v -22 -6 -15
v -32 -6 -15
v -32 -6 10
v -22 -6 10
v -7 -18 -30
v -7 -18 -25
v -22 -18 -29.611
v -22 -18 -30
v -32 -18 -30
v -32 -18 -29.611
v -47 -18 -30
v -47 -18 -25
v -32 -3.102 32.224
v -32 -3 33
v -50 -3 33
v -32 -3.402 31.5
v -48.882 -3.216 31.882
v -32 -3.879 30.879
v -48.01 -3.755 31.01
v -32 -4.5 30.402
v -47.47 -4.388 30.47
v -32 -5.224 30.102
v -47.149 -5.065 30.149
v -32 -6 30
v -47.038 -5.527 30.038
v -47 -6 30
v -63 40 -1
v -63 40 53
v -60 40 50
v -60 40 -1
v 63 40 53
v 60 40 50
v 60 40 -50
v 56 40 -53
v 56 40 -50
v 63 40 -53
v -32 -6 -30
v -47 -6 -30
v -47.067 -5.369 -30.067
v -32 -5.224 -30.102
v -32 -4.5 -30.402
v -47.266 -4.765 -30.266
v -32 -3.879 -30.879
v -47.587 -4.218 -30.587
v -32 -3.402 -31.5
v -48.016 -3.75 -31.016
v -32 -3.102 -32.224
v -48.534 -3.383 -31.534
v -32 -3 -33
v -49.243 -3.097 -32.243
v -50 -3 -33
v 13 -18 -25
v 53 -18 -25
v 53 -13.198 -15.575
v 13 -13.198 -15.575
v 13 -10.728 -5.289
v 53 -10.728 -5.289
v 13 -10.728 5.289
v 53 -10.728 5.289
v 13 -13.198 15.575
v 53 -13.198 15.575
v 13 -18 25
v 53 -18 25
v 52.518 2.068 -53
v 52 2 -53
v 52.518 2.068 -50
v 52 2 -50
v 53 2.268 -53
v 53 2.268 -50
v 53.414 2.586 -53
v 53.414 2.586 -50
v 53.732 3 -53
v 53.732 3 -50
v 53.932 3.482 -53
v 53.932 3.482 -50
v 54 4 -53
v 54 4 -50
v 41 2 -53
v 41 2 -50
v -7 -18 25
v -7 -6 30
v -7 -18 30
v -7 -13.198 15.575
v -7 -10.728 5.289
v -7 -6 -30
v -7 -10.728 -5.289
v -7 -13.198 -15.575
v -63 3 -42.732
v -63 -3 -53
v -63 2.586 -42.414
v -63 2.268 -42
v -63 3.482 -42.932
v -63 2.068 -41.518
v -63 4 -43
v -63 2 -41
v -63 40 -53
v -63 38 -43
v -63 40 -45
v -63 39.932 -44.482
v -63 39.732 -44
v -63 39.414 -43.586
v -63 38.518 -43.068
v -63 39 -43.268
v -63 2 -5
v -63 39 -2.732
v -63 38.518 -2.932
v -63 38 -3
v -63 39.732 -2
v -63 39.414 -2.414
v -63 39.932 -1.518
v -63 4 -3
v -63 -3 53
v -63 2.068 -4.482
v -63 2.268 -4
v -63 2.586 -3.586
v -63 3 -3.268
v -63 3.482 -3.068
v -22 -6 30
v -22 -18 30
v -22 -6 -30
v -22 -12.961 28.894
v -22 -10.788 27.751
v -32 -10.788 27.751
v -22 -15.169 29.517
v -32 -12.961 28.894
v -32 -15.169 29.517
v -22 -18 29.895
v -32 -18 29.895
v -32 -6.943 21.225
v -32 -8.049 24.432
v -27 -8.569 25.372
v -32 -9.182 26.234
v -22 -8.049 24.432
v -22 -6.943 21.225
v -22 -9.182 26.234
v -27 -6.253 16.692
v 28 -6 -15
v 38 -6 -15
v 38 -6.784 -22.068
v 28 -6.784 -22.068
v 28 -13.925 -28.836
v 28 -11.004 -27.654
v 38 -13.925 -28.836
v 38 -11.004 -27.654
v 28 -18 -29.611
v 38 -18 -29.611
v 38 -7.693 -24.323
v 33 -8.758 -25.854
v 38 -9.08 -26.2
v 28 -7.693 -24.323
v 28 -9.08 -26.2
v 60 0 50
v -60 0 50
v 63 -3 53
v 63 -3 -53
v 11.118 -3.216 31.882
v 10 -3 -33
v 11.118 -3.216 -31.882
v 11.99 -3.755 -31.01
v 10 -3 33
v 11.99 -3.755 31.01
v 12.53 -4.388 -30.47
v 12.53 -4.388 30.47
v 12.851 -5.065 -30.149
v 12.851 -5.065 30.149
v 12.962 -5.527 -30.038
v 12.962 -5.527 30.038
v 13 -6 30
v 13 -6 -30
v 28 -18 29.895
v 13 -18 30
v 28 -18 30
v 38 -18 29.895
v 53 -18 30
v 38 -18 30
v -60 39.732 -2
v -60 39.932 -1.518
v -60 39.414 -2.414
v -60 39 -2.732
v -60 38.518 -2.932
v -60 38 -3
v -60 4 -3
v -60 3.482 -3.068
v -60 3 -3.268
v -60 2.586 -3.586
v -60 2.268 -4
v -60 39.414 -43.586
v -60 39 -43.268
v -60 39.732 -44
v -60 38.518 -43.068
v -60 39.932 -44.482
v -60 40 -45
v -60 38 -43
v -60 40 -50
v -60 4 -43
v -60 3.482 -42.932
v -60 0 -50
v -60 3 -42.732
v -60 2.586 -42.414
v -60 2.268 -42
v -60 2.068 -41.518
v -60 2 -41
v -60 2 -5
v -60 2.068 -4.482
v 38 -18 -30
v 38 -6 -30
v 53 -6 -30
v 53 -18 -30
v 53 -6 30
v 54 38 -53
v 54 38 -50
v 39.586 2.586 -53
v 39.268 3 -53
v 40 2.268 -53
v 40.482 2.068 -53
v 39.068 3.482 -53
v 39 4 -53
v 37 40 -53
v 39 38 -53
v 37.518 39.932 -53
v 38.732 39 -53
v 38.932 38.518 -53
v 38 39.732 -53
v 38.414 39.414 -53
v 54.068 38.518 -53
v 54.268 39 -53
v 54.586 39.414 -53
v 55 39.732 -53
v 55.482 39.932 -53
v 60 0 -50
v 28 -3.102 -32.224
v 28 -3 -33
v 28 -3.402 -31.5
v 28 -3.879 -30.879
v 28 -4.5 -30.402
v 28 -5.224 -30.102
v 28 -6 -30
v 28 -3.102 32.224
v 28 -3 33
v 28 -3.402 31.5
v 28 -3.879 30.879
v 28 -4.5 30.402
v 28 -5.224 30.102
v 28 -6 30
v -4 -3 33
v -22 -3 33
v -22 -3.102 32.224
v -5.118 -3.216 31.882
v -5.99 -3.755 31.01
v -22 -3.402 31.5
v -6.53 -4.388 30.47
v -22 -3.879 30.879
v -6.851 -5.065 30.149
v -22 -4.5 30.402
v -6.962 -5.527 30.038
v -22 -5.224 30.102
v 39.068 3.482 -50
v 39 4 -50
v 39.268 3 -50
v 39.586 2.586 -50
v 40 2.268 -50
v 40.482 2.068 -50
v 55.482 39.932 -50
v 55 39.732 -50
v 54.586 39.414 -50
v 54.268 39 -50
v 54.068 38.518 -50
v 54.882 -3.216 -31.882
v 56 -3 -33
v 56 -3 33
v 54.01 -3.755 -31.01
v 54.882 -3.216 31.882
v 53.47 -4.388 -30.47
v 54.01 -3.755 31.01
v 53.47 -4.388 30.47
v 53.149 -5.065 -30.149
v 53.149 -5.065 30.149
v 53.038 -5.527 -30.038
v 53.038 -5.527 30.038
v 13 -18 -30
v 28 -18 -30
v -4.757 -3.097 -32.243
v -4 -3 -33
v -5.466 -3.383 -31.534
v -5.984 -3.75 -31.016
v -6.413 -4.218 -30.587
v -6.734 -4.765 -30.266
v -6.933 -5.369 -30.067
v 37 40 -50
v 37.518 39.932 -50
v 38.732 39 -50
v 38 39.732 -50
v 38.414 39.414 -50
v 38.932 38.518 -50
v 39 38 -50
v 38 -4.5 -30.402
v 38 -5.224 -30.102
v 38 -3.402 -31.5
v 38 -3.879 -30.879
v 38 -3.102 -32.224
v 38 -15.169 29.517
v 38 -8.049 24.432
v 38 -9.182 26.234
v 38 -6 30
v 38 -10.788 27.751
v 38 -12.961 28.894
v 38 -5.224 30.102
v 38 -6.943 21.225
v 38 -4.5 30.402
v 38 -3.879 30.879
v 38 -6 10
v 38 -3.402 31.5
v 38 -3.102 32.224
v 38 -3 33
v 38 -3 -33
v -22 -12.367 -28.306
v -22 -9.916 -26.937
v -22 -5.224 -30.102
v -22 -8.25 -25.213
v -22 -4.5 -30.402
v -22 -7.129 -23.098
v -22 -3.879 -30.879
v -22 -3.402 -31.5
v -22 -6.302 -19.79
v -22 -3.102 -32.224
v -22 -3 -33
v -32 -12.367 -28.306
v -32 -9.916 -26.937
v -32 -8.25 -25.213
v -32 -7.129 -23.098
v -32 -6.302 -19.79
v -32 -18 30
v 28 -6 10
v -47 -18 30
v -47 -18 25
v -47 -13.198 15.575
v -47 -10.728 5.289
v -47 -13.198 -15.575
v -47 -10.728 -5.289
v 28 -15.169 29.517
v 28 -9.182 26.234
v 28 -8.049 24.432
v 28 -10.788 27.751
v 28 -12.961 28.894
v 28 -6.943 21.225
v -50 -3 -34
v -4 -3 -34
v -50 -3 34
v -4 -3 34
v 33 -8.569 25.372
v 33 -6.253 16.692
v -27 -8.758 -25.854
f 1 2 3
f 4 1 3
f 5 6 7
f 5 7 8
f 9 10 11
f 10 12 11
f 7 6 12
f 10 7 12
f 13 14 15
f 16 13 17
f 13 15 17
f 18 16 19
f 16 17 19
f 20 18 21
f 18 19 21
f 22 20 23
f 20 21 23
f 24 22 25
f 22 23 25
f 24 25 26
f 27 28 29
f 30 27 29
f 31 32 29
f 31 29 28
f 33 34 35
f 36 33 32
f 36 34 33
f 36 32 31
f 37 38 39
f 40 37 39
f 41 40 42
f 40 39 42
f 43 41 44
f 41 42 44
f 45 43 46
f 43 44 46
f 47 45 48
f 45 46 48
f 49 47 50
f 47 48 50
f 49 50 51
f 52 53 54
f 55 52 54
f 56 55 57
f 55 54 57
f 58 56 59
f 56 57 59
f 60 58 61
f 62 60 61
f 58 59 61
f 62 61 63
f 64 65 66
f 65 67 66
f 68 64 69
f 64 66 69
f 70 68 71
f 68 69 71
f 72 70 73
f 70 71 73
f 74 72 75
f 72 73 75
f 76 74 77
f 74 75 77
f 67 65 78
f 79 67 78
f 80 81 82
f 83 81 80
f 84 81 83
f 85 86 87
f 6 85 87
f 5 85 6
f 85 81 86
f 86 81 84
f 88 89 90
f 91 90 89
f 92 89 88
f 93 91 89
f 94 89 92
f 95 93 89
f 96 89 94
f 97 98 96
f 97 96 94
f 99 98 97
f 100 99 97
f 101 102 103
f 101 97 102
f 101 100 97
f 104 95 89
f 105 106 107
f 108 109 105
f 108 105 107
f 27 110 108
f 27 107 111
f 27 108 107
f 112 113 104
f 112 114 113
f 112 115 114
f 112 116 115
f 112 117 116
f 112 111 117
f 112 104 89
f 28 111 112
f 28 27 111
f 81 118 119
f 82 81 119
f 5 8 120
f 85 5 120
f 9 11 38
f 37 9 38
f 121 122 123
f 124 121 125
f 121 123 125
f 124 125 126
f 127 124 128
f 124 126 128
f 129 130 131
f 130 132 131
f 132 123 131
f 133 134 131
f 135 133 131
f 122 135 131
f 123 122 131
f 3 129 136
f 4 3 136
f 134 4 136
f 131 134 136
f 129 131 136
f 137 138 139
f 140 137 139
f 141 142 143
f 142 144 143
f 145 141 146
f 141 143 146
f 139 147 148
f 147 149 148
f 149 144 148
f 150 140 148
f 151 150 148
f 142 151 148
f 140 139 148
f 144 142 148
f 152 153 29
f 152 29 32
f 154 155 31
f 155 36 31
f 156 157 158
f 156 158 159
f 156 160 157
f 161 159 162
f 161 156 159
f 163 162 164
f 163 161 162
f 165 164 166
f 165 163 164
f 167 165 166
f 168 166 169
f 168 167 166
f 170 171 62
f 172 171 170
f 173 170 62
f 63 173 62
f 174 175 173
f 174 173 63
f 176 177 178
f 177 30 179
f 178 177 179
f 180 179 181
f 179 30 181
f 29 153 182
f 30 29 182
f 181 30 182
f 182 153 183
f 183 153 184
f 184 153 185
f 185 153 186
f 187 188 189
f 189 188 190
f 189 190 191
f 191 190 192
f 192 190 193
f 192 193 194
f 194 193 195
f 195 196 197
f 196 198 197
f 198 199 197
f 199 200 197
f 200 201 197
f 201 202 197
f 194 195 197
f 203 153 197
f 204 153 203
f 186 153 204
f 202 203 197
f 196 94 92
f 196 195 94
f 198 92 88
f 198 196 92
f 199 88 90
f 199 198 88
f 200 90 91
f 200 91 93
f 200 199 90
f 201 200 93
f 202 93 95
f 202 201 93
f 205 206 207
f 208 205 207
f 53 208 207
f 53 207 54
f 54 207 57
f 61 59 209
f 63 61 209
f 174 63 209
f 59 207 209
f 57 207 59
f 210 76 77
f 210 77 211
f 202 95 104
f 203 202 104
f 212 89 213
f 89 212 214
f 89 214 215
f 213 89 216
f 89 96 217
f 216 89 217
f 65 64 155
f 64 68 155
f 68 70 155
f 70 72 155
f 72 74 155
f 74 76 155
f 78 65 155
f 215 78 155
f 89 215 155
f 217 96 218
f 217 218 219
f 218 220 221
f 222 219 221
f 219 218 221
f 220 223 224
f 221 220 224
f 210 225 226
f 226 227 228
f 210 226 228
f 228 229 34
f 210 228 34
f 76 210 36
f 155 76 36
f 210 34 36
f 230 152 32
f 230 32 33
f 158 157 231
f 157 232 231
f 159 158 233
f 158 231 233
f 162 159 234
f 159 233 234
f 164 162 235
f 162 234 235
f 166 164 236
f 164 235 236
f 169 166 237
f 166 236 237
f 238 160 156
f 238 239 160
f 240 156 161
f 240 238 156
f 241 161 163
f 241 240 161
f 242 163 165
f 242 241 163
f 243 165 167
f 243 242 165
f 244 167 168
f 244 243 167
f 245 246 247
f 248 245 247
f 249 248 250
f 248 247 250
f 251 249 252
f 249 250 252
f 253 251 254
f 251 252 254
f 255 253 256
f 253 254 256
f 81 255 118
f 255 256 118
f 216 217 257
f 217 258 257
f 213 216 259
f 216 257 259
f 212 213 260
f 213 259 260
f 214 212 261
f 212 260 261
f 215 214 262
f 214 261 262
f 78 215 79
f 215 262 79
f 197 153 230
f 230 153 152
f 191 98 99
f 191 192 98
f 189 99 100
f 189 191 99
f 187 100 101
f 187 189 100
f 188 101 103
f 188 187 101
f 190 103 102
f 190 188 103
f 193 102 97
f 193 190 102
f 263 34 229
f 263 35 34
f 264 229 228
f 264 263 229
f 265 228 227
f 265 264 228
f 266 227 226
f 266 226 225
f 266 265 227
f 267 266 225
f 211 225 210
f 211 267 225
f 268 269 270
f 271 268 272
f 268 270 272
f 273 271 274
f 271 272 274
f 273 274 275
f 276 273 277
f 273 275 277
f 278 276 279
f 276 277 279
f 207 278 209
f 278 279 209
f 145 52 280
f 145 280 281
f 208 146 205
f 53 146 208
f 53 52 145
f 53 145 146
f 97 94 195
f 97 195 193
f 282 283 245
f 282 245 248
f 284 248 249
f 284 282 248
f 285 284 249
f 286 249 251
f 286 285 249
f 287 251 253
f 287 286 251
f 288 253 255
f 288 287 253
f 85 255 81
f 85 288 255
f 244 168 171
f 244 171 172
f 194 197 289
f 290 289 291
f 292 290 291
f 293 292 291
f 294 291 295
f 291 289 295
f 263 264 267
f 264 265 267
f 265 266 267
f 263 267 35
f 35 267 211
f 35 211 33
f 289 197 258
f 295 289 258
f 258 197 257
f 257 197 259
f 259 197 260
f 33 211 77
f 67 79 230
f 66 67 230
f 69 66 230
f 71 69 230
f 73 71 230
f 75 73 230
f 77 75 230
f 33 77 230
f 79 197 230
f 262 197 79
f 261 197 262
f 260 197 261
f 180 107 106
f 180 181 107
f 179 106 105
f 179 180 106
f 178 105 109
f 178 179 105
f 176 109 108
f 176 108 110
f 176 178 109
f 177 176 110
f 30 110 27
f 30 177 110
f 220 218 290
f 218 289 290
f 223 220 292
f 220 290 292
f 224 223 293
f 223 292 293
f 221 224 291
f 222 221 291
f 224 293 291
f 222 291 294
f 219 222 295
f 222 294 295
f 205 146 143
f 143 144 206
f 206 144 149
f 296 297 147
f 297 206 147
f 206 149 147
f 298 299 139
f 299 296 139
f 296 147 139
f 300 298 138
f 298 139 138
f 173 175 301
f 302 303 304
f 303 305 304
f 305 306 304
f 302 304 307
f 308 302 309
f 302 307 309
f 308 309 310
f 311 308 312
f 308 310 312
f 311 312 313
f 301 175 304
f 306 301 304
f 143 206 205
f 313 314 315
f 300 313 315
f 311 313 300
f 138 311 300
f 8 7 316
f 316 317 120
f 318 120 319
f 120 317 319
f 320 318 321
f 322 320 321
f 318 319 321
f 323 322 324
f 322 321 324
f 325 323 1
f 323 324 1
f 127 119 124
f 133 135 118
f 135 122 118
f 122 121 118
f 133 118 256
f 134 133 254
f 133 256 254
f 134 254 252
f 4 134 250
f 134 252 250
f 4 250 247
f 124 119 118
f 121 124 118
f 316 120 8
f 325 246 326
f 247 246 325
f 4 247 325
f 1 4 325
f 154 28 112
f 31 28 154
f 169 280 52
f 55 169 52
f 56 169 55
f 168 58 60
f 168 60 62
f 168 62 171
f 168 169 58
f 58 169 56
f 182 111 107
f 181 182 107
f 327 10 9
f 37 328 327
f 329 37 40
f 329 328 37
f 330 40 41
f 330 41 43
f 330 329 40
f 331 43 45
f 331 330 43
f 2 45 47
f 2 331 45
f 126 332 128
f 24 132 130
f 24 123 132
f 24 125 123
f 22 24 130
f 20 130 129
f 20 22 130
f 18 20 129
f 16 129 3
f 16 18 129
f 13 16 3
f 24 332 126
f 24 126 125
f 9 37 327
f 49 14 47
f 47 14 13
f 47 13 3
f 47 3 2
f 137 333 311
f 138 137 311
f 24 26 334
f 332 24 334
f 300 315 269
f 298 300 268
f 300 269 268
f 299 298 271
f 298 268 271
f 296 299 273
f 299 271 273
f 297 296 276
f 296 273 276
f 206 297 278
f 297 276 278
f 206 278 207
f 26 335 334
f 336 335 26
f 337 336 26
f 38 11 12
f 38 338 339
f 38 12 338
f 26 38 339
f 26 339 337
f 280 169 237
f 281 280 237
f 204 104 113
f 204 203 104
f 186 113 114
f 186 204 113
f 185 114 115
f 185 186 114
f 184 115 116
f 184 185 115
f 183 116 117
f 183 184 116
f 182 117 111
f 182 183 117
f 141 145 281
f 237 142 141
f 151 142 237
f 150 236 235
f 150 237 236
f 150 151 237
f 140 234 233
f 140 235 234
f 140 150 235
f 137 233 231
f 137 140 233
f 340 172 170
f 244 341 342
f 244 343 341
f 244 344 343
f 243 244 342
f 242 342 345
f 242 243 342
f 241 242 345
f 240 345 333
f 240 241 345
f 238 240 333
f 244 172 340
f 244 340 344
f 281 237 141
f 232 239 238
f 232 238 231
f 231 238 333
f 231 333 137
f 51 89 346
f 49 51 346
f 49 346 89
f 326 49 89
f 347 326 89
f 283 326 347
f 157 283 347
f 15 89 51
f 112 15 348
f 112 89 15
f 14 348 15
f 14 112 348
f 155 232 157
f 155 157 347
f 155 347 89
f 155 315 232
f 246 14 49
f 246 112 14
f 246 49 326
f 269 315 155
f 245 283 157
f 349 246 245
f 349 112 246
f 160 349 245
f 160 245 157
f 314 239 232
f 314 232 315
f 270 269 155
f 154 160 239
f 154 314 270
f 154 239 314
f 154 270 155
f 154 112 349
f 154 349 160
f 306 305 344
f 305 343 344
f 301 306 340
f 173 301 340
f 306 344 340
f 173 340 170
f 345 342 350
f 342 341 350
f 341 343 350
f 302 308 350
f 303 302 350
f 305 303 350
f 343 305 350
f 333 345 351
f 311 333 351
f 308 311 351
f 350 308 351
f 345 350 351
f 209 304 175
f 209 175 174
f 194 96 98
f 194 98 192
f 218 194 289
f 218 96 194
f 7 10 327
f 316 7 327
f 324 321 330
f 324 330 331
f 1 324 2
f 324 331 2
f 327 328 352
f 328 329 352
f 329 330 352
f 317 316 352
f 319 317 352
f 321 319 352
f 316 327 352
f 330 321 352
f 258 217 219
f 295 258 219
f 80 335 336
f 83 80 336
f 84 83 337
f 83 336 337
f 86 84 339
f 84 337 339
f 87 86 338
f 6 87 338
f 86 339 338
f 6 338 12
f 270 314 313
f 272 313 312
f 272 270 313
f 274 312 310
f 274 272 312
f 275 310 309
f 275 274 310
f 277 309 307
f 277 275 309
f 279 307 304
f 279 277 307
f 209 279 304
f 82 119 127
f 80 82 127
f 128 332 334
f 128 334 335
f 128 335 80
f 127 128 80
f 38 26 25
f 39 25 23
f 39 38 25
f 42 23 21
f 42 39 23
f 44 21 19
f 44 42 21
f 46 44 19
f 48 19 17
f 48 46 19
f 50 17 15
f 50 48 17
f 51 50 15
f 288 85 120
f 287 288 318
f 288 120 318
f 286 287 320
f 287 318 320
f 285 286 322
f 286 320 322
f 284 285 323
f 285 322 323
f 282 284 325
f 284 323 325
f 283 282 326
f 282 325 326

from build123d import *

# Parameters (mm, degrees)
SKETCH1_W           = 126
SKETCH1_H           = 106
SKETCH1_W_2         = 120
SKETCH1_H_2         = 100
BOSS_EXTRUDE1_DEPTH = 40
SKETCH5_W           = 126
SKETCH5_H           = 106
BOSS_EXTRUDE3_DEPTH = 3
SKETCH6_W           = 40
SKETCH6_H           = 60
BOSS_EXTRUDE4_DEPTH = 15
CUT_EXTRUDE3_DEPTH  = 92
SKETCH9_W           = 5
SKETCH9_H           = 3
CUT_EXTRUDE4_DEPTH  = 92
FILLET2_SIZE        = 15
FILLET2_SIZE_2      = 20
FILLET3_R           = 3
LPATTERN2_START     = -47
LPATTERN2_DEPTH     = 40
LPATTERN2_START_2   = -50
LPATTERN2_2_DEPTH   = 18
LPATTERN2_START_3   = -22
LPATTERN2_3_DEPTH   = 18
LPATTERN2_START_4   = -34
LPATTERN2_4_DEPTH   = 68
SKETCH10_W          = 15
SKETCH10_H          = 38
CUT_EXTRUDE5_DEPTH  = 10
SKETCH11_W          = 40
SKETCH11_H          = 38
CUT_EXTRUDE6_DEPTH  = 10
FILLET4_R           = 2


with BuildPart() as part:
    # Sketch1 → Boss-Extrude1 (new body)
    with BuildSketch(Plane(origin=(0, 0, 0), x_dir=(1, 0, 0), z_dir=(0, 1, 0))):
        Rectangle(SKETCH1_W, SKETCH1_H)
        Rectangle(SKETCH1_W_2, SKETCH1_H_2, mode=Mode.SUBTRACT)
    extrude(amount=BOSS_EXTRUDE1_DEPTH)

    # Sketch5 → Boss-Extrude3 (add)
    with BuildSketch(Plane.XZ):
        Rectangle(SKETCH5_W, SKETCH5_H)
    extrude(amount=BOSS_EXTRUDE3_DEPTH)

    # Sketch6 → Boss-Extrude4 (add)
    with BuildSketch(Plane.XZ.offset(3)):
        with Locations((33, 0)):
            Rectangle(SKETCH6_W, SKETCH6_H)
    extrude(amount=BOSS_EXTRUDE4_DEPTH)

    # Sketch7 → Cut-Extrude3 (cut)
    with BuildSketch(Plane(origin=(53, 0, 0), x_dir=(0, 0, -1), z_dir=(1, 0, 0))):
        with BuildLine():
            Line((-25, -18), (25, -18))
            ThreePointArc((25, -18), (0, -10.416573868), (-25, -18))
        make_face()
    extrude(amount=-CUT_EXTRUDE3_DEPTH, mode=Mode.SUBTRACT)

    # Sketch9 → Cut-Extrude4 (cut)
    with BuildSketch(Plane.XY.offset(30)):
        with Locations((30.5, -4.5)):
            Rectangle(SKETCH9_W, SKETCH9_H)
        with Locations((35.5, -4.5)):
            Rectangle(SKETCH9_W, SKETCH9_H)
    extrude(amount=-CUT_EXTRUDE4_DEPTH, mode=Mode.SUBTRACT)

    # Fillet2
    # a fillet whose section is not a circle: 20, 15 mm, written as the material it takes off along each edge
    with BuildSketch(Plane(origin=(38, -6, -30), x_dir=(0, 0, 1), z_dir=(-1, 0, 0))) as fillet2_piece_1:
        with BuildLine():
            Bezier((FILLET2_SIZE, 0), (0, 0), (0, -FILLET2_SIZE_2), weights=[1, 1.5, 1])
            Line((0, -FILLET2_SIZE_2), (0, 0))
            Line((0, 0), (FILLET2_SIZE, 0))
        make_face()
    extrude(amount=10, mode=Mode.SUBTRACT)
    with BuildSketch(Plane(origin=(28, -6, 30), x_dir=(0, 0, -1), z_dir=(1, 0, 0))) as fillet2_piece_2:
        with BuildLine():
            Bezier((FILLET2_SIZE_2, 0), (0, 0), (0, -FILLET2_SIZE), weights=[1, 1.5, 1])
            Line((0, -FILLET2_SIZE), (0, 0))
            Line((0, 0), (FILLET2_SIZE_2, 0))
        make_face()
    extrude(amount=10, mode=Mode.SUBTRACT)

    # Fillet3
    fillet3_edges = [part.edges().sort_by_distance(p)[0] for p in [
        (53, -3, 0),
        (45.5, -3, 30),
        (13, -3, 0),
        (20.5, -3, -30),
        (45.5, -3, -30),
        (20.5, -3, 30),
    ]]
    fillet(fillet3_edges, radius=FILLET3_R)



with BuildPart() as body_2:
    # LPattern2: read off the stored shape, not the designer's step
    # LPattern2 outline → LPattern2 (new body)
    with BuildSketch(Plane.YZ.offset(LPATTERN2_START)):
        with BuildLine():
            Line((-6, -15), (-6, 10))
            add(Edge.make_bspline(
                [(-6, 10), (-6, 28.973665961), (-18, 29.894663844)],
                knots=[0, 0, 0, 0.924950591, 0.924950591, 0.924950591], degree=2, weights=[1, 1.462475296, 1.069416995]))
            Line((-18, 29.894663844), (-18, 25))
            ThreePointArc((-18, 25), (-10.416573868, 0), (-18, -25))
            Line((-18, -25), (-18, -29.611278447))
            add(Edge.make_bspline(
                [(-18, -29.611278447), (-6, -28.174650985), (-6, -15)],
                knots=[0.172065577, 0.172065577, 0.172065577, 1, 1, 1], degree=2, weights=[1.142459014, 1.413967211, 1]))
        make_face()
    extrude(amount=LPATTERN2_DEPTH)


with BuildPart() as part_1:
    add(part.part)

    add(body_2.part)  # LPattern2 2 merges body 2
    # LPattern2 2 outline → LPattern2 2 (add)
    with BuildSketch(Plane.YZ.offset(LPATTERN2_START_2)):
        with BuildLine():
            ThreePointArc((-3, 33), (-3.878679656, 30.878679656), (-6, 30))
            Line((-6, 30), (-18, 30))
            Line((-18, 30), (-18, 29.894663844))
            add(Edge.make_bspline(
                [(-6, 10), (-6, 28.973665961), (-18, 29.894663844)],
                knots=[0, 0, 0, 0.924950591, 0.924950591, 0.924950591], degree=2, weights=[1, 1.462475296, 1.069416995]))
            Line((-6, 10), (-6, -15))
            add(Edge.make_bspline(
                [(-18, -29.611278447), (-6, -28.174650985), (-6, -15)],
                knots=[0.172065577, 0.172065577, 0.172065577, 1, 1, 1], degree=2, weights=[1.142459014, 1.413967211, 1]))
            Line((-18, -29.611278447), (-18, -30))
            Line((-18, -30), (-6, -30))
            ThreePointArc((-6, -30), (-3.878679656, -30.878679656), (-3, -33))
            Line((-3, -33), (-3, 33))
        make_face()
    extrude(amount=LPATTERN2_2_DEPTH)

    # LPattern2 3 outline → LPattern2 3 (add)
    with BuildSketch(Plane.YZ.offset(LPATTERN2_START_3)):
        with BuildLine():
            ThreePointArc((-3, 33), (-3.878679656, 30.878679656), (-6, 30))
            Line((-6, 30), (-18, 30))
            Line((-18, 30), (-18, 29.894663844))
            add(Edge.make_bspline(
                [(-6, 10), (-6, 28.973665961), (-18, 29.894663844)],
                knots=[0, 0, 0, 0.924950591, 0.924950591, 0.924950591], degree=2, weights=[1, 1.462475296, 1.069416995]))
            Line((-6, 10), (-6, -15))
            add(Edge.make_bspline(
                [(-18, -29.611278447), (-6, -28.174650985), (-6, -15)],
                knots=[0.172065577, 0.172065577, 0.172065577, 1, 1, 1], degree=2, weights=[1.142459014, 1.413967211, 1]))
            Line((-18, -29.611278447), (-18, -30))
            Line((-18, -30), (-6, -30))
            ThreePointArc((-6, -30), (-3.878679656, -30.878679656), (-3, -33))
            Line((-3, -33), (-3, 33))
        make_face()
    extrude(amount=LPATTERN2_3_DEPTH)

    # LPattern2 4 outline → LPattern2 4 (cut)
    with BuildSketch(Plane.XY.offset(LPATTERN2_START_4)):
        with BuildLine():
            Line((-50, -18), (-47, -18))
            Line((-47, -18), (-47, -6))
            ThreePointArc((-47, -6), (-47.878679656, -3.878679656), (-50, -3))
            Line((-50, -3), (-50, -18))
        make_face()
        with BuildLine():
            Line((-4, -18), (-4, -3))
            ThreePointArc((-4, -3), (-6.121320344, -3.878679656), (-7, -6))
            Line((-7, -6), (-7, -18))
            Line((-7, -18), (-4, -18))
        make_face()
    extrude(amount=LPATTERN2_4_DEPTH, mode=Mode.SUBTRACT)

    # Sketch10 → Cut-Extrude5 (cut)
    with BuildSketch(Plane(origin=(0, 0, -53), x_dir=(-1, 0, 0), z_dir=(0, 0, -1))):
        with Locations((-46.5, 21)):
            Rectangle(SKETCH10_W, SKETCH10_H)
    extrude(amount=-CUT_EXTRUDE5_DEPTH, mode=Mode.SUBTRACT)

    # Sketch11 → Cut-Extrude6 (cut)
    with BuildSketch(Plane.ZY.offset(63)):
        with Locations((-23, 21)):
            Rectangle(SKETCH11_W, SKETCH11_H)
    extrude(amount=-CUT_EXTRUDE6_DEPTH, mode=Mode.SUBTRACT)

    # Fillet4
    fillet4_edges = [part_1.edges().sort_by_distance(p)[0] for p in [
        (39, 40, -51.5),
        (54, 40, -51.5),
        (39, 2, -51.5),
        (54, 2, -51.5),
        (-61.5, 40, -3),
        (-61.5, 40, -43),
        (-61.5, 2, -3),
        (-61.5, 2, -43),
    ]]
    fillet(fillet4_edges, radius=FILLET4_R)


solid = part_1.part
